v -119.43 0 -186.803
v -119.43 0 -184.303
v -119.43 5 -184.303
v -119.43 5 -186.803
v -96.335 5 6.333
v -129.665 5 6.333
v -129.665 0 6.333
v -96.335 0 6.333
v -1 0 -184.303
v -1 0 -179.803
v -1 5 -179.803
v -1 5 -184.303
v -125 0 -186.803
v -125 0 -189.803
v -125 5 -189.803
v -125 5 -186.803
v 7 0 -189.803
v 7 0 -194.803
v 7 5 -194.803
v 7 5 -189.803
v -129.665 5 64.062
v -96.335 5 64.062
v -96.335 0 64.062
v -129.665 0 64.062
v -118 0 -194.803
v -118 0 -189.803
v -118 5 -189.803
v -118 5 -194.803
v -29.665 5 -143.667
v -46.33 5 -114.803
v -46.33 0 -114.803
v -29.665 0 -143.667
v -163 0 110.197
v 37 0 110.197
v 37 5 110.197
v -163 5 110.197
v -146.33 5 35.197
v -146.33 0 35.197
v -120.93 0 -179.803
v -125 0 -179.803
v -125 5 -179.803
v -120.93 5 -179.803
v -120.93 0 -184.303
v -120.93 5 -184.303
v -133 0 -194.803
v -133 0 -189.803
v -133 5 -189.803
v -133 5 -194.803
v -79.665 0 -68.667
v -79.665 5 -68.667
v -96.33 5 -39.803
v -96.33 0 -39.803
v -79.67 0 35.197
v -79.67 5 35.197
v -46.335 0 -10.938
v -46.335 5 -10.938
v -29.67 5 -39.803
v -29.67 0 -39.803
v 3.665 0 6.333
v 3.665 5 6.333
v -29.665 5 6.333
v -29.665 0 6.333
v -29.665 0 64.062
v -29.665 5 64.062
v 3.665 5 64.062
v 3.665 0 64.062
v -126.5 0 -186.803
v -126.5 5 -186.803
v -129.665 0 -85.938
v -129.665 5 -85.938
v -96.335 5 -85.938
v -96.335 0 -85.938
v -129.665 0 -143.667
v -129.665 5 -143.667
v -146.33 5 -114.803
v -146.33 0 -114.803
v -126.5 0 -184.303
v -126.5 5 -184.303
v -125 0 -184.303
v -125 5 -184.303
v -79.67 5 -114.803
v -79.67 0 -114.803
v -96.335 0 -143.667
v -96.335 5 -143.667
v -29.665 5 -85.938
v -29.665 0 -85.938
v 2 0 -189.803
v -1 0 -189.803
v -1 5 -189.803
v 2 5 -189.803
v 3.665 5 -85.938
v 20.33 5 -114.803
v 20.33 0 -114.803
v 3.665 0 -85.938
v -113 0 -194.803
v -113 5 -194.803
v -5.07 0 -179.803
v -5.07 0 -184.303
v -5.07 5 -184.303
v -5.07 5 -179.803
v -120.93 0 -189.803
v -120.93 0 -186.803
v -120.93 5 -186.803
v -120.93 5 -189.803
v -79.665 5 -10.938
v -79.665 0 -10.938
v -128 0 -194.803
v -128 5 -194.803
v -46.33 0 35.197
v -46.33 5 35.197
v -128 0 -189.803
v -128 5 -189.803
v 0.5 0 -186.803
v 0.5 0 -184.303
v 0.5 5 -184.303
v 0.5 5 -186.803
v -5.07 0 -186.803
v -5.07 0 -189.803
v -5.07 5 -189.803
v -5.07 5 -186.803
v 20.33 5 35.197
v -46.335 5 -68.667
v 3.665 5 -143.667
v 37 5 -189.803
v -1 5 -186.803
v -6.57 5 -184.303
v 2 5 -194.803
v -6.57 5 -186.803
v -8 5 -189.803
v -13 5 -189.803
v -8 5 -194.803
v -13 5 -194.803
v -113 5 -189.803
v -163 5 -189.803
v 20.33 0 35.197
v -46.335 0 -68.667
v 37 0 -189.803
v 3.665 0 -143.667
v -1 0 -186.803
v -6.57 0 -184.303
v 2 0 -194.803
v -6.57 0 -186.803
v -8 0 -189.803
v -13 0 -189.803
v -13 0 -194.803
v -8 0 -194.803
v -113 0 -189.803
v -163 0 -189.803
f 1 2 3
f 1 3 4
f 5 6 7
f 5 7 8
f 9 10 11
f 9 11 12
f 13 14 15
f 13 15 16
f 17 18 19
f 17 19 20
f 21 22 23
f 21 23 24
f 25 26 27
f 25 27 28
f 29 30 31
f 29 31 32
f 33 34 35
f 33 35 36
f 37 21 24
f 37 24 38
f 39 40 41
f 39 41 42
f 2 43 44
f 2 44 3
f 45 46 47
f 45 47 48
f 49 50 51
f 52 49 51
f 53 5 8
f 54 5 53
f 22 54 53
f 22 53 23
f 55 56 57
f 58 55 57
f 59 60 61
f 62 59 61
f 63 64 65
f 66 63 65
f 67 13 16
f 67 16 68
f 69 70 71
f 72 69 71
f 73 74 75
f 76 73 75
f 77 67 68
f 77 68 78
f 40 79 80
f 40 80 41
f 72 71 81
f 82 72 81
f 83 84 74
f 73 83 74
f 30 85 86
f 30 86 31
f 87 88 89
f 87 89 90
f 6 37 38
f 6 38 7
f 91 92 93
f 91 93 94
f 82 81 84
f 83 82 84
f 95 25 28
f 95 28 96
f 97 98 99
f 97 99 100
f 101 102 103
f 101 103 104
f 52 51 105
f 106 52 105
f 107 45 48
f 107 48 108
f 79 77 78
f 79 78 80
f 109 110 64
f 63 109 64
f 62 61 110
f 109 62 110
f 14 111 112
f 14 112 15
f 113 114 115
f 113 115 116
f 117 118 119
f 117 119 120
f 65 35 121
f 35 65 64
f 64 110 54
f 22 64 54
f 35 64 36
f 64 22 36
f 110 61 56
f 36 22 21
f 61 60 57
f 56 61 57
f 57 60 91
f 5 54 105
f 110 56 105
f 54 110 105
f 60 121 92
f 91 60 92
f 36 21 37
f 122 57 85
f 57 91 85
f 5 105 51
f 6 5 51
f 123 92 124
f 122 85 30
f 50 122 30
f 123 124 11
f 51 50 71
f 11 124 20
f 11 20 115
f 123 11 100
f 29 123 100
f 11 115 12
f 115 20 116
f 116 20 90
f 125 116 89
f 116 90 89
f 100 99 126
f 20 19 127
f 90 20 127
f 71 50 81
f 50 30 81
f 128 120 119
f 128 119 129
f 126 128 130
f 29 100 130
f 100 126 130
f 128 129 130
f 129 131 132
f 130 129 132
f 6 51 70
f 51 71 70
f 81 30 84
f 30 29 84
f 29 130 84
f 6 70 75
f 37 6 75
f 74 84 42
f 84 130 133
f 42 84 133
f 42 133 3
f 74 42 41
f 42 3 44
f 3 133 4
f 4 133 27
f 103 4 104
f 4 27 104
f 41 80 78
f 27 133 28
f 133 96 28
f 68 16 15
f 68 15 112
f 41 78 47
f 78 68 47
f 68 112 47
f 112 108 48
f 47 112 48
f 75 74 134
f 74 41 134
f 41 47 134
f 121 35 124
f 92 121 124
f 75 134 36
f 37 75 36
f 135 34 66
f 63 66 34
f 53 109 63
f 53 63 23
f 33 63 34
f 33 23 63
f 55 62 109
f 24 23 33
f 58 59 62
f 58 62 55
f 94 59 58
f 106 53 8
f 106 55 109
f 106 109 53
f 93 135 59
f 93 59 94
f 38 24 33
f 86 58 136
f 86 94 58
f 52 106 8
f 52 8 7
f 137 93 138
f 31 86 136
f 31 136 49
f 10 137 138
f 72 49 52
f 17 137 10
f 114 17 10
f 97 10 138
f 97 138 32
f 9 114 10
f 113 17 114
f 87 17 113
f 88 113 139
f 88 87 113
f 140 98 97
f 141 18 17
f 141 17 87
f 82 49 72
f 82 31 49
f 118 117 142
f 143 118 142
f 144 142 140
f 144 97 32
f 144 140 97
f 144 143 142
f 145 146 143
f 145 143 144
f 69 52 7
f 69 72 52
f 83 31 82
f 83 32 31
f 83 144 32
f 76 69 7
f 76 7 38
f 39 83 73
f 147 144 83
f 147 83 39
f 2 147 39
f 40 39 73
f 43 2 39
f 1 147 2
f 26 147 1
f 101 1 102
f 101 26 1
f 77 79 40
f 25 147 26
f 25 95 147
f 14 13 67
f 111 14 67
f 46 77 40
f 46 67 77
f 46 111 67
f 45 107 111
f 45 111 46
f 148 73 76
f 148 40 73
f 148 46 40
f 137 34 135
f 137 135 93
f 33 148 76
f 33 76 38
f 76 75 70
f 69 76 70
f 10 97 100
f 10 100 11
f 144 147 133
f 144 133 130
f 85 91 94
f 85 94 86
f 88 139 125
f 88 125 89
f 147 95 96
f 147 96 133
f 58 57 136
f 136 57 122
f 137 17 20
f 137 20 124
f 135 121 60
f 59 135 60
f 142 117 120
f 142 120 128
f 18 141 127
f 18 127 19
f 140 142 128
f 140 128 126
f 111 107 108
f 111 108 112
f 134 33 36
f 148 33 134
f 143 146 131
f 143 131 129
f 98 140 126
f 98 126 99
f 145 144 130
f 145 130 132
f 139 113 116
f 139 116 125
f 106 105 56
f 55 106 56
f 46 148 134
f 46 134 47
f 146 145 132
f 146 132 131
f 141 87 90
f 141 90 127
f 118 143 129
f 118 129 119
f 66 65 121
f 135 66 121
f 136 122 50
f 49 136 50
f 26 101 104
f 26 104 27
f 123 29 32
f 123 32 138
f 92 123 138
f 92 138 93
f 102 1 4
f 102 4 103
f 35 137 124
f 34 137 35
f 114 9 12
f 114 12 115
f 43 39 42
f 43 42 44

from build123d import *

# Parameters (mm, degrees)
BOSS_EXTRUDE1_DEPTH = 5
CUT_EXTRUDE1_DEPTH  = 5


with BuildPart() as part:
    # Sketch1 → Boss-Extrude1 (new body)
    with BuildSketch(Plane(origin=(0, 0, 0), x_dir=(1, 0, 0), z_dir=(0, 1, 0))):
        Polygon((-163.000117017, 189.802822602), (-133.000117017, 189.802822602), (-133.000117017, 194.802822602), (-128.000117017, 194.802822602), (-128.000117017, 189.802822602), (-125.000117017, 189.802822602), (-125.000117017, 186.802822602), (-126.500117017, 186.802822602), (-126.500117017, 184.302822602), (-125.000117017, 184.302822602), (-125.000117017, 179.802822602), (-120.929768881, 179.802822602), (-120.929768881, 184.302822602), (-119.429768881, 184.302822602), (-119.429768881, 186.802822602), (-120.929768881, 186.802822602), (-120.929768881, 189.802822602), (-118.000117017, 189.802822602), (-118.000117017, 194.802822602), (-113.000117017, 194.802822602), (-113.000117017, 189.802822602), (-13.000117017, 189.802822602), (-13.000117017, 194.802822602), (-8.000117017, 194.802822602), (-8.000117017, 189.802822602), (-5.070465153, 189.802822602), (-5.070465153, 186.802822602), (-6.570465153, 186.802822602), (-6.570465153, 184.302822602), (-5.070465153, 184.302822602), (-5.070465153, 179.802822602), (-1.000117017, 179.802822602), (-1.000117017, 184.302822602), (0.499882983, 184.302822602), (0.499882983, 186.802822602), (-1.000117017, 186.802822602), (-1.000117017, 189.802822602), (1.999882983, 189.802822602), (1.999882983, 194.802822602), (6.999882983, 194.802822602), (6.999882983, 189.802822602), (36.999882983, 189.802822602), (36.999882983, -110.197177398), (-163.000117017, -110.197177398), align=None)
    extrude(amount=BOSS_EXTRUDE1_DEPTH)

    # Sketch2 → Cut-Extrude1 (cut)
    with BuildSketch(Plane(origin=(0, 5, 0), x_dir=(1, 0, 0), z_dir=(0, 1, 0))):
        Polygon((3.664882983, 143.66744931), (20.329882983, 114.802822602), (3.664882983, 85.938195894), (-29.665117017, 85.938195894), (-46.330117017, 114.802822602), (-29.665117017, 143.66744931), align=None)
        Polygon((-79.670117017, 114.802822602), (-96.335117017, 143.66744931), (-129.665117017, 143.66744931), (-146.330117017, 114.802822602), (-129.665117017, 85.938195894), (-96.335117017, 85.938195894), align=None)
        Polygon((-29.665117017, -64.061804106), (3.664882983, -64.061804106), (20.329882983, -35.197177398), (3.664882983, -6.33255069), (-29.665117017, -6.33255069), (-46.330117017, -35.197177398), align=None)
        Polygon((-79.670117017, -35.197177398), (-96.335117017, -64.061804106), (-129.665117017, -64.061804106), (-146.330117017, -35.197177398), (-129.665117017, -6.33255069), (-96.335117017, -6.33255069), align=None)
        Polygon((-29.670117017, 39.802822602), (-46.335117017, 68.66744931), (-79.665117017, 68.66744931), (-96.330117017, 39.802822602), (-79.665117017, 10.938195894), (-46.335117017, 10.938195894), align=None)
    extrude(amount=-CUT_EXTRUDE1_DEPTH, mode=Mode.SUBTRACT)


solid = part.part
